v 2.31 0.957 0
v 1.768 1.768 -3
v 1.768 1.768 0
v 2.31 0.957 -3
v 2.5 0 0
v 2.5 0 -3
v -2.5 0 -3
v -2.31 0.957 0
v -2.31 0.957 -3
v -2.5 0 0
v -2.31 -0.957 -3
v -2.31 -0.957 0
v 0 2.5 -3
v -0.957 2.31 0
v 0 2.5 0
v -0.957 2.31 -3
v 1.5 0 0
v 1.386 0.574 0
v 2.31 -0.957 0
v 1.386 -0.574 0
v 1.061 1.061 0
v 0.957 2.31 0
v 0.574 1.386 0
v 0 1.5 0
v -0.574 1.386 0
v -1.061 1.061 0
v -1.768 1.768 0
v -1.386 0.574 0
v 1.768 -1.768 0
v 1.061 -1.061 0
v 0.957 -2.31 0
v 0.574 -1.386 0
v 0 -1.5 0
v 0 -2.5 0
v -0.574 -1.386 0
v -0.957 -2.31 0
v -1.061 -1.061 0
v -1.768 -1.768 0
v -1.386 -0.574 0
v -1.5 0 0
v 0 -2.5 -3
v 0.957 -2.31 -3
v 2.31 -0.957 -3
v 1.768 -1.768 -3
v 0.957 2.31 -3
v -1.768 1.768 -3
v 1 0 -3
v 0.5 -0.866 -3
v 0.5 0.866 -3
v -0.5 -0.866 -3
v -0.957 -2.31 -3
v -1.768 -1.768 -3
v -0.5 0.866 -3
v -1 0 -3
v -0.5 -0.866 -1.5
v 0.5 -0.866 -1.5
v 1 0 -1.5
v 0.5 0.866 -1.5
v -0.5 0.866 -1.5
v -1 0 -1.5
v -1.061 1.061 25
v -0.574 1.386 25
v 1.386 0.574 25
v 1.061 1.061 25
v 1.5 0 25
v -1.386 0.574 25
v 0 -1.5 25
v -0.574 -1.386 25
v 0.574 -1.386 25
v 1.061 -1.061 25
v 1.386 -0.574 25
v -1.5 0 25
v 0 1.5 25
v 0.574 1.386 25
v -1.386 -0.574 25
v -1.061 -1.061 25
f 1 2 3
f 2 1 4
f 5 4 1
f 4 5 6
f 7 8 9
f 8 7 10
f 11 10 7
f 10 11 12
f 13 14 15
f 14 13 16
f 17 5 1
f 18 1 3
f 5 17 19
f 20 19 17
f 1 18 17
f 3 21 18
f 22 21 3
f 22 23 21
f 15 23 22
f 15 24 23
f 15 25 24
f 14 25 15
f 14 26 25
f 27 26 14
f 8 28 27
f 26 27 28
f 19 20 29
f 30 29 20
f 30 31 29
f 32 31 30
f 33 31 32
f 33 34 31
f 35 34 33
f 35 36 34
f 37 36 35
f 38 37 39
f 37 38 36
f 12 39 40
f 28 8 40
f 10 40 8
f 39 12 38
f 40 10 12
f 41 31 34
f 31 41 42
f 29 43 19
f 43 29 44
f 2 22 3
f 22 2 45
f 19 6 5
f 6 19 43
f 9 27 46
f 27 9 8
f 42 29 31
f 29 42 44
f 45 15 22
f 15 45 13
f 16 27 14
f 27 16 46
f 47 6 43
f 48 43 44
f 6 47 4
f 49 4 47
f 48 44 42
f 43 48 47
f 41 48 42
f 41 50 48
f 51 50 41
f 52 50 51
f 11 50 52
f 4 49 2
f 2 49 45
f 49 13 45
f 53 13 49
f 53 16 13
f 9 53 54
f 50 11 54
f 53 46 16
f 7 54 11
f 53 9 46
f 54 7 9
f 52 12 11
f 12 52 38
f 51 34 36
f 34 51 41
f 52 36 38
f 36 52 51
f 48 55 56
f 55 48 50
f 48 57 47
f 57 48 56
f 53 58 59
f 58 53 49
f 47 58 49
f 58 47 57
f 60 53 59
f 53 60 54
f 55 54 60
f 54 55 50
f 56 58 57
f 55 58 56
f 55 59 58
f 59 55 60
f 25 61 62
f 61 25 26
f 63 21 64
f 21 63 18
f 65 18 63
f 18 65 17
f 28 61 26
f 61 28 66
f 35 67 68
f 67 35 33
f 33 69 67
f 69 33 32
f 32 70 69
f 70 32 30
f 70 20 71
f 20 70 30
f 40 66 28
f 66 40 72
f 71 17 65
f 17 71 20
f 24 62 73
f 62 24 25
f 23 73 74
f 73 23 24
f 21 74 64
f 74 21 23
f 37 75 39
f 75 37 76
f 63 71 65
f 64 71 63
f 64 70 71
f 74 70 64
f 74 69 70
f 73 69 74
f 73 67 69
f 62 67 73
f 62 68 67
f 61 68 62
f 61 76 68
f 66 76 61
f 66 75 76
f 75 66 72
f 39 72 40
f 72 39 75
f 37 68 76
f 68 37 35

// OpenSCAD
// Part number: 000002
// Part version: 0001
// Part name: M3 Hex bolt, 25 mm length, Wrench size = 2.0 mm
// Sourced part, non-printable


Part_000002_0001_Show(false);

module Part_000002_0001_Show(simplified=false)
{
    if(simplified)
    {
        p_000002_0001_M3_Bolt(25, head_in=false, center=false, $fn=8);
    }
    else
    {
        p_000002_0001_M3_Bolt(25, head_in=false, center=false, $fn=16);
    }
}

module p_000002_0001_M3_Bolt(length, head_in=false, center=false, $fn=$fn)
{
    color("grey")
    p_000002_0001_Bolt(head_diameter=5, wrench_size=2, head_height=3, bolt_diameter=3, bolt_length=length, head_in=head_in, center=center, $fn = $fn);
}

module p_000002_0001_Bolt(head_diameter, wrench_size, head_height, bolt_diameter, bolt_length,  head_in = false, center=false, $fn=$fn)
{
    t = center ? 
        (head_in ?
            (head_height + bolt_length)/2 :  //center, head in
            head_height + bolt_length/2      //center, head out
        ) :                    
        (head_in ?                     
            0 :                         //no center, head in
            head_height                 //no center, head out
        );
    translate([0,0,-t])
    union()
    {
        difference()
        {
            cylinder(d=head_diameter, h=head_height, $fn=$fn);
            translate([0,0,-1])
            cylinder(d=wrench_size, h=head_height/2+1, $fn=6);
        } 
        translate([0,0,head_height])
        cylinder(d=bolt_diameter, h=bolt_length, $fn=$fn);
    }
}
